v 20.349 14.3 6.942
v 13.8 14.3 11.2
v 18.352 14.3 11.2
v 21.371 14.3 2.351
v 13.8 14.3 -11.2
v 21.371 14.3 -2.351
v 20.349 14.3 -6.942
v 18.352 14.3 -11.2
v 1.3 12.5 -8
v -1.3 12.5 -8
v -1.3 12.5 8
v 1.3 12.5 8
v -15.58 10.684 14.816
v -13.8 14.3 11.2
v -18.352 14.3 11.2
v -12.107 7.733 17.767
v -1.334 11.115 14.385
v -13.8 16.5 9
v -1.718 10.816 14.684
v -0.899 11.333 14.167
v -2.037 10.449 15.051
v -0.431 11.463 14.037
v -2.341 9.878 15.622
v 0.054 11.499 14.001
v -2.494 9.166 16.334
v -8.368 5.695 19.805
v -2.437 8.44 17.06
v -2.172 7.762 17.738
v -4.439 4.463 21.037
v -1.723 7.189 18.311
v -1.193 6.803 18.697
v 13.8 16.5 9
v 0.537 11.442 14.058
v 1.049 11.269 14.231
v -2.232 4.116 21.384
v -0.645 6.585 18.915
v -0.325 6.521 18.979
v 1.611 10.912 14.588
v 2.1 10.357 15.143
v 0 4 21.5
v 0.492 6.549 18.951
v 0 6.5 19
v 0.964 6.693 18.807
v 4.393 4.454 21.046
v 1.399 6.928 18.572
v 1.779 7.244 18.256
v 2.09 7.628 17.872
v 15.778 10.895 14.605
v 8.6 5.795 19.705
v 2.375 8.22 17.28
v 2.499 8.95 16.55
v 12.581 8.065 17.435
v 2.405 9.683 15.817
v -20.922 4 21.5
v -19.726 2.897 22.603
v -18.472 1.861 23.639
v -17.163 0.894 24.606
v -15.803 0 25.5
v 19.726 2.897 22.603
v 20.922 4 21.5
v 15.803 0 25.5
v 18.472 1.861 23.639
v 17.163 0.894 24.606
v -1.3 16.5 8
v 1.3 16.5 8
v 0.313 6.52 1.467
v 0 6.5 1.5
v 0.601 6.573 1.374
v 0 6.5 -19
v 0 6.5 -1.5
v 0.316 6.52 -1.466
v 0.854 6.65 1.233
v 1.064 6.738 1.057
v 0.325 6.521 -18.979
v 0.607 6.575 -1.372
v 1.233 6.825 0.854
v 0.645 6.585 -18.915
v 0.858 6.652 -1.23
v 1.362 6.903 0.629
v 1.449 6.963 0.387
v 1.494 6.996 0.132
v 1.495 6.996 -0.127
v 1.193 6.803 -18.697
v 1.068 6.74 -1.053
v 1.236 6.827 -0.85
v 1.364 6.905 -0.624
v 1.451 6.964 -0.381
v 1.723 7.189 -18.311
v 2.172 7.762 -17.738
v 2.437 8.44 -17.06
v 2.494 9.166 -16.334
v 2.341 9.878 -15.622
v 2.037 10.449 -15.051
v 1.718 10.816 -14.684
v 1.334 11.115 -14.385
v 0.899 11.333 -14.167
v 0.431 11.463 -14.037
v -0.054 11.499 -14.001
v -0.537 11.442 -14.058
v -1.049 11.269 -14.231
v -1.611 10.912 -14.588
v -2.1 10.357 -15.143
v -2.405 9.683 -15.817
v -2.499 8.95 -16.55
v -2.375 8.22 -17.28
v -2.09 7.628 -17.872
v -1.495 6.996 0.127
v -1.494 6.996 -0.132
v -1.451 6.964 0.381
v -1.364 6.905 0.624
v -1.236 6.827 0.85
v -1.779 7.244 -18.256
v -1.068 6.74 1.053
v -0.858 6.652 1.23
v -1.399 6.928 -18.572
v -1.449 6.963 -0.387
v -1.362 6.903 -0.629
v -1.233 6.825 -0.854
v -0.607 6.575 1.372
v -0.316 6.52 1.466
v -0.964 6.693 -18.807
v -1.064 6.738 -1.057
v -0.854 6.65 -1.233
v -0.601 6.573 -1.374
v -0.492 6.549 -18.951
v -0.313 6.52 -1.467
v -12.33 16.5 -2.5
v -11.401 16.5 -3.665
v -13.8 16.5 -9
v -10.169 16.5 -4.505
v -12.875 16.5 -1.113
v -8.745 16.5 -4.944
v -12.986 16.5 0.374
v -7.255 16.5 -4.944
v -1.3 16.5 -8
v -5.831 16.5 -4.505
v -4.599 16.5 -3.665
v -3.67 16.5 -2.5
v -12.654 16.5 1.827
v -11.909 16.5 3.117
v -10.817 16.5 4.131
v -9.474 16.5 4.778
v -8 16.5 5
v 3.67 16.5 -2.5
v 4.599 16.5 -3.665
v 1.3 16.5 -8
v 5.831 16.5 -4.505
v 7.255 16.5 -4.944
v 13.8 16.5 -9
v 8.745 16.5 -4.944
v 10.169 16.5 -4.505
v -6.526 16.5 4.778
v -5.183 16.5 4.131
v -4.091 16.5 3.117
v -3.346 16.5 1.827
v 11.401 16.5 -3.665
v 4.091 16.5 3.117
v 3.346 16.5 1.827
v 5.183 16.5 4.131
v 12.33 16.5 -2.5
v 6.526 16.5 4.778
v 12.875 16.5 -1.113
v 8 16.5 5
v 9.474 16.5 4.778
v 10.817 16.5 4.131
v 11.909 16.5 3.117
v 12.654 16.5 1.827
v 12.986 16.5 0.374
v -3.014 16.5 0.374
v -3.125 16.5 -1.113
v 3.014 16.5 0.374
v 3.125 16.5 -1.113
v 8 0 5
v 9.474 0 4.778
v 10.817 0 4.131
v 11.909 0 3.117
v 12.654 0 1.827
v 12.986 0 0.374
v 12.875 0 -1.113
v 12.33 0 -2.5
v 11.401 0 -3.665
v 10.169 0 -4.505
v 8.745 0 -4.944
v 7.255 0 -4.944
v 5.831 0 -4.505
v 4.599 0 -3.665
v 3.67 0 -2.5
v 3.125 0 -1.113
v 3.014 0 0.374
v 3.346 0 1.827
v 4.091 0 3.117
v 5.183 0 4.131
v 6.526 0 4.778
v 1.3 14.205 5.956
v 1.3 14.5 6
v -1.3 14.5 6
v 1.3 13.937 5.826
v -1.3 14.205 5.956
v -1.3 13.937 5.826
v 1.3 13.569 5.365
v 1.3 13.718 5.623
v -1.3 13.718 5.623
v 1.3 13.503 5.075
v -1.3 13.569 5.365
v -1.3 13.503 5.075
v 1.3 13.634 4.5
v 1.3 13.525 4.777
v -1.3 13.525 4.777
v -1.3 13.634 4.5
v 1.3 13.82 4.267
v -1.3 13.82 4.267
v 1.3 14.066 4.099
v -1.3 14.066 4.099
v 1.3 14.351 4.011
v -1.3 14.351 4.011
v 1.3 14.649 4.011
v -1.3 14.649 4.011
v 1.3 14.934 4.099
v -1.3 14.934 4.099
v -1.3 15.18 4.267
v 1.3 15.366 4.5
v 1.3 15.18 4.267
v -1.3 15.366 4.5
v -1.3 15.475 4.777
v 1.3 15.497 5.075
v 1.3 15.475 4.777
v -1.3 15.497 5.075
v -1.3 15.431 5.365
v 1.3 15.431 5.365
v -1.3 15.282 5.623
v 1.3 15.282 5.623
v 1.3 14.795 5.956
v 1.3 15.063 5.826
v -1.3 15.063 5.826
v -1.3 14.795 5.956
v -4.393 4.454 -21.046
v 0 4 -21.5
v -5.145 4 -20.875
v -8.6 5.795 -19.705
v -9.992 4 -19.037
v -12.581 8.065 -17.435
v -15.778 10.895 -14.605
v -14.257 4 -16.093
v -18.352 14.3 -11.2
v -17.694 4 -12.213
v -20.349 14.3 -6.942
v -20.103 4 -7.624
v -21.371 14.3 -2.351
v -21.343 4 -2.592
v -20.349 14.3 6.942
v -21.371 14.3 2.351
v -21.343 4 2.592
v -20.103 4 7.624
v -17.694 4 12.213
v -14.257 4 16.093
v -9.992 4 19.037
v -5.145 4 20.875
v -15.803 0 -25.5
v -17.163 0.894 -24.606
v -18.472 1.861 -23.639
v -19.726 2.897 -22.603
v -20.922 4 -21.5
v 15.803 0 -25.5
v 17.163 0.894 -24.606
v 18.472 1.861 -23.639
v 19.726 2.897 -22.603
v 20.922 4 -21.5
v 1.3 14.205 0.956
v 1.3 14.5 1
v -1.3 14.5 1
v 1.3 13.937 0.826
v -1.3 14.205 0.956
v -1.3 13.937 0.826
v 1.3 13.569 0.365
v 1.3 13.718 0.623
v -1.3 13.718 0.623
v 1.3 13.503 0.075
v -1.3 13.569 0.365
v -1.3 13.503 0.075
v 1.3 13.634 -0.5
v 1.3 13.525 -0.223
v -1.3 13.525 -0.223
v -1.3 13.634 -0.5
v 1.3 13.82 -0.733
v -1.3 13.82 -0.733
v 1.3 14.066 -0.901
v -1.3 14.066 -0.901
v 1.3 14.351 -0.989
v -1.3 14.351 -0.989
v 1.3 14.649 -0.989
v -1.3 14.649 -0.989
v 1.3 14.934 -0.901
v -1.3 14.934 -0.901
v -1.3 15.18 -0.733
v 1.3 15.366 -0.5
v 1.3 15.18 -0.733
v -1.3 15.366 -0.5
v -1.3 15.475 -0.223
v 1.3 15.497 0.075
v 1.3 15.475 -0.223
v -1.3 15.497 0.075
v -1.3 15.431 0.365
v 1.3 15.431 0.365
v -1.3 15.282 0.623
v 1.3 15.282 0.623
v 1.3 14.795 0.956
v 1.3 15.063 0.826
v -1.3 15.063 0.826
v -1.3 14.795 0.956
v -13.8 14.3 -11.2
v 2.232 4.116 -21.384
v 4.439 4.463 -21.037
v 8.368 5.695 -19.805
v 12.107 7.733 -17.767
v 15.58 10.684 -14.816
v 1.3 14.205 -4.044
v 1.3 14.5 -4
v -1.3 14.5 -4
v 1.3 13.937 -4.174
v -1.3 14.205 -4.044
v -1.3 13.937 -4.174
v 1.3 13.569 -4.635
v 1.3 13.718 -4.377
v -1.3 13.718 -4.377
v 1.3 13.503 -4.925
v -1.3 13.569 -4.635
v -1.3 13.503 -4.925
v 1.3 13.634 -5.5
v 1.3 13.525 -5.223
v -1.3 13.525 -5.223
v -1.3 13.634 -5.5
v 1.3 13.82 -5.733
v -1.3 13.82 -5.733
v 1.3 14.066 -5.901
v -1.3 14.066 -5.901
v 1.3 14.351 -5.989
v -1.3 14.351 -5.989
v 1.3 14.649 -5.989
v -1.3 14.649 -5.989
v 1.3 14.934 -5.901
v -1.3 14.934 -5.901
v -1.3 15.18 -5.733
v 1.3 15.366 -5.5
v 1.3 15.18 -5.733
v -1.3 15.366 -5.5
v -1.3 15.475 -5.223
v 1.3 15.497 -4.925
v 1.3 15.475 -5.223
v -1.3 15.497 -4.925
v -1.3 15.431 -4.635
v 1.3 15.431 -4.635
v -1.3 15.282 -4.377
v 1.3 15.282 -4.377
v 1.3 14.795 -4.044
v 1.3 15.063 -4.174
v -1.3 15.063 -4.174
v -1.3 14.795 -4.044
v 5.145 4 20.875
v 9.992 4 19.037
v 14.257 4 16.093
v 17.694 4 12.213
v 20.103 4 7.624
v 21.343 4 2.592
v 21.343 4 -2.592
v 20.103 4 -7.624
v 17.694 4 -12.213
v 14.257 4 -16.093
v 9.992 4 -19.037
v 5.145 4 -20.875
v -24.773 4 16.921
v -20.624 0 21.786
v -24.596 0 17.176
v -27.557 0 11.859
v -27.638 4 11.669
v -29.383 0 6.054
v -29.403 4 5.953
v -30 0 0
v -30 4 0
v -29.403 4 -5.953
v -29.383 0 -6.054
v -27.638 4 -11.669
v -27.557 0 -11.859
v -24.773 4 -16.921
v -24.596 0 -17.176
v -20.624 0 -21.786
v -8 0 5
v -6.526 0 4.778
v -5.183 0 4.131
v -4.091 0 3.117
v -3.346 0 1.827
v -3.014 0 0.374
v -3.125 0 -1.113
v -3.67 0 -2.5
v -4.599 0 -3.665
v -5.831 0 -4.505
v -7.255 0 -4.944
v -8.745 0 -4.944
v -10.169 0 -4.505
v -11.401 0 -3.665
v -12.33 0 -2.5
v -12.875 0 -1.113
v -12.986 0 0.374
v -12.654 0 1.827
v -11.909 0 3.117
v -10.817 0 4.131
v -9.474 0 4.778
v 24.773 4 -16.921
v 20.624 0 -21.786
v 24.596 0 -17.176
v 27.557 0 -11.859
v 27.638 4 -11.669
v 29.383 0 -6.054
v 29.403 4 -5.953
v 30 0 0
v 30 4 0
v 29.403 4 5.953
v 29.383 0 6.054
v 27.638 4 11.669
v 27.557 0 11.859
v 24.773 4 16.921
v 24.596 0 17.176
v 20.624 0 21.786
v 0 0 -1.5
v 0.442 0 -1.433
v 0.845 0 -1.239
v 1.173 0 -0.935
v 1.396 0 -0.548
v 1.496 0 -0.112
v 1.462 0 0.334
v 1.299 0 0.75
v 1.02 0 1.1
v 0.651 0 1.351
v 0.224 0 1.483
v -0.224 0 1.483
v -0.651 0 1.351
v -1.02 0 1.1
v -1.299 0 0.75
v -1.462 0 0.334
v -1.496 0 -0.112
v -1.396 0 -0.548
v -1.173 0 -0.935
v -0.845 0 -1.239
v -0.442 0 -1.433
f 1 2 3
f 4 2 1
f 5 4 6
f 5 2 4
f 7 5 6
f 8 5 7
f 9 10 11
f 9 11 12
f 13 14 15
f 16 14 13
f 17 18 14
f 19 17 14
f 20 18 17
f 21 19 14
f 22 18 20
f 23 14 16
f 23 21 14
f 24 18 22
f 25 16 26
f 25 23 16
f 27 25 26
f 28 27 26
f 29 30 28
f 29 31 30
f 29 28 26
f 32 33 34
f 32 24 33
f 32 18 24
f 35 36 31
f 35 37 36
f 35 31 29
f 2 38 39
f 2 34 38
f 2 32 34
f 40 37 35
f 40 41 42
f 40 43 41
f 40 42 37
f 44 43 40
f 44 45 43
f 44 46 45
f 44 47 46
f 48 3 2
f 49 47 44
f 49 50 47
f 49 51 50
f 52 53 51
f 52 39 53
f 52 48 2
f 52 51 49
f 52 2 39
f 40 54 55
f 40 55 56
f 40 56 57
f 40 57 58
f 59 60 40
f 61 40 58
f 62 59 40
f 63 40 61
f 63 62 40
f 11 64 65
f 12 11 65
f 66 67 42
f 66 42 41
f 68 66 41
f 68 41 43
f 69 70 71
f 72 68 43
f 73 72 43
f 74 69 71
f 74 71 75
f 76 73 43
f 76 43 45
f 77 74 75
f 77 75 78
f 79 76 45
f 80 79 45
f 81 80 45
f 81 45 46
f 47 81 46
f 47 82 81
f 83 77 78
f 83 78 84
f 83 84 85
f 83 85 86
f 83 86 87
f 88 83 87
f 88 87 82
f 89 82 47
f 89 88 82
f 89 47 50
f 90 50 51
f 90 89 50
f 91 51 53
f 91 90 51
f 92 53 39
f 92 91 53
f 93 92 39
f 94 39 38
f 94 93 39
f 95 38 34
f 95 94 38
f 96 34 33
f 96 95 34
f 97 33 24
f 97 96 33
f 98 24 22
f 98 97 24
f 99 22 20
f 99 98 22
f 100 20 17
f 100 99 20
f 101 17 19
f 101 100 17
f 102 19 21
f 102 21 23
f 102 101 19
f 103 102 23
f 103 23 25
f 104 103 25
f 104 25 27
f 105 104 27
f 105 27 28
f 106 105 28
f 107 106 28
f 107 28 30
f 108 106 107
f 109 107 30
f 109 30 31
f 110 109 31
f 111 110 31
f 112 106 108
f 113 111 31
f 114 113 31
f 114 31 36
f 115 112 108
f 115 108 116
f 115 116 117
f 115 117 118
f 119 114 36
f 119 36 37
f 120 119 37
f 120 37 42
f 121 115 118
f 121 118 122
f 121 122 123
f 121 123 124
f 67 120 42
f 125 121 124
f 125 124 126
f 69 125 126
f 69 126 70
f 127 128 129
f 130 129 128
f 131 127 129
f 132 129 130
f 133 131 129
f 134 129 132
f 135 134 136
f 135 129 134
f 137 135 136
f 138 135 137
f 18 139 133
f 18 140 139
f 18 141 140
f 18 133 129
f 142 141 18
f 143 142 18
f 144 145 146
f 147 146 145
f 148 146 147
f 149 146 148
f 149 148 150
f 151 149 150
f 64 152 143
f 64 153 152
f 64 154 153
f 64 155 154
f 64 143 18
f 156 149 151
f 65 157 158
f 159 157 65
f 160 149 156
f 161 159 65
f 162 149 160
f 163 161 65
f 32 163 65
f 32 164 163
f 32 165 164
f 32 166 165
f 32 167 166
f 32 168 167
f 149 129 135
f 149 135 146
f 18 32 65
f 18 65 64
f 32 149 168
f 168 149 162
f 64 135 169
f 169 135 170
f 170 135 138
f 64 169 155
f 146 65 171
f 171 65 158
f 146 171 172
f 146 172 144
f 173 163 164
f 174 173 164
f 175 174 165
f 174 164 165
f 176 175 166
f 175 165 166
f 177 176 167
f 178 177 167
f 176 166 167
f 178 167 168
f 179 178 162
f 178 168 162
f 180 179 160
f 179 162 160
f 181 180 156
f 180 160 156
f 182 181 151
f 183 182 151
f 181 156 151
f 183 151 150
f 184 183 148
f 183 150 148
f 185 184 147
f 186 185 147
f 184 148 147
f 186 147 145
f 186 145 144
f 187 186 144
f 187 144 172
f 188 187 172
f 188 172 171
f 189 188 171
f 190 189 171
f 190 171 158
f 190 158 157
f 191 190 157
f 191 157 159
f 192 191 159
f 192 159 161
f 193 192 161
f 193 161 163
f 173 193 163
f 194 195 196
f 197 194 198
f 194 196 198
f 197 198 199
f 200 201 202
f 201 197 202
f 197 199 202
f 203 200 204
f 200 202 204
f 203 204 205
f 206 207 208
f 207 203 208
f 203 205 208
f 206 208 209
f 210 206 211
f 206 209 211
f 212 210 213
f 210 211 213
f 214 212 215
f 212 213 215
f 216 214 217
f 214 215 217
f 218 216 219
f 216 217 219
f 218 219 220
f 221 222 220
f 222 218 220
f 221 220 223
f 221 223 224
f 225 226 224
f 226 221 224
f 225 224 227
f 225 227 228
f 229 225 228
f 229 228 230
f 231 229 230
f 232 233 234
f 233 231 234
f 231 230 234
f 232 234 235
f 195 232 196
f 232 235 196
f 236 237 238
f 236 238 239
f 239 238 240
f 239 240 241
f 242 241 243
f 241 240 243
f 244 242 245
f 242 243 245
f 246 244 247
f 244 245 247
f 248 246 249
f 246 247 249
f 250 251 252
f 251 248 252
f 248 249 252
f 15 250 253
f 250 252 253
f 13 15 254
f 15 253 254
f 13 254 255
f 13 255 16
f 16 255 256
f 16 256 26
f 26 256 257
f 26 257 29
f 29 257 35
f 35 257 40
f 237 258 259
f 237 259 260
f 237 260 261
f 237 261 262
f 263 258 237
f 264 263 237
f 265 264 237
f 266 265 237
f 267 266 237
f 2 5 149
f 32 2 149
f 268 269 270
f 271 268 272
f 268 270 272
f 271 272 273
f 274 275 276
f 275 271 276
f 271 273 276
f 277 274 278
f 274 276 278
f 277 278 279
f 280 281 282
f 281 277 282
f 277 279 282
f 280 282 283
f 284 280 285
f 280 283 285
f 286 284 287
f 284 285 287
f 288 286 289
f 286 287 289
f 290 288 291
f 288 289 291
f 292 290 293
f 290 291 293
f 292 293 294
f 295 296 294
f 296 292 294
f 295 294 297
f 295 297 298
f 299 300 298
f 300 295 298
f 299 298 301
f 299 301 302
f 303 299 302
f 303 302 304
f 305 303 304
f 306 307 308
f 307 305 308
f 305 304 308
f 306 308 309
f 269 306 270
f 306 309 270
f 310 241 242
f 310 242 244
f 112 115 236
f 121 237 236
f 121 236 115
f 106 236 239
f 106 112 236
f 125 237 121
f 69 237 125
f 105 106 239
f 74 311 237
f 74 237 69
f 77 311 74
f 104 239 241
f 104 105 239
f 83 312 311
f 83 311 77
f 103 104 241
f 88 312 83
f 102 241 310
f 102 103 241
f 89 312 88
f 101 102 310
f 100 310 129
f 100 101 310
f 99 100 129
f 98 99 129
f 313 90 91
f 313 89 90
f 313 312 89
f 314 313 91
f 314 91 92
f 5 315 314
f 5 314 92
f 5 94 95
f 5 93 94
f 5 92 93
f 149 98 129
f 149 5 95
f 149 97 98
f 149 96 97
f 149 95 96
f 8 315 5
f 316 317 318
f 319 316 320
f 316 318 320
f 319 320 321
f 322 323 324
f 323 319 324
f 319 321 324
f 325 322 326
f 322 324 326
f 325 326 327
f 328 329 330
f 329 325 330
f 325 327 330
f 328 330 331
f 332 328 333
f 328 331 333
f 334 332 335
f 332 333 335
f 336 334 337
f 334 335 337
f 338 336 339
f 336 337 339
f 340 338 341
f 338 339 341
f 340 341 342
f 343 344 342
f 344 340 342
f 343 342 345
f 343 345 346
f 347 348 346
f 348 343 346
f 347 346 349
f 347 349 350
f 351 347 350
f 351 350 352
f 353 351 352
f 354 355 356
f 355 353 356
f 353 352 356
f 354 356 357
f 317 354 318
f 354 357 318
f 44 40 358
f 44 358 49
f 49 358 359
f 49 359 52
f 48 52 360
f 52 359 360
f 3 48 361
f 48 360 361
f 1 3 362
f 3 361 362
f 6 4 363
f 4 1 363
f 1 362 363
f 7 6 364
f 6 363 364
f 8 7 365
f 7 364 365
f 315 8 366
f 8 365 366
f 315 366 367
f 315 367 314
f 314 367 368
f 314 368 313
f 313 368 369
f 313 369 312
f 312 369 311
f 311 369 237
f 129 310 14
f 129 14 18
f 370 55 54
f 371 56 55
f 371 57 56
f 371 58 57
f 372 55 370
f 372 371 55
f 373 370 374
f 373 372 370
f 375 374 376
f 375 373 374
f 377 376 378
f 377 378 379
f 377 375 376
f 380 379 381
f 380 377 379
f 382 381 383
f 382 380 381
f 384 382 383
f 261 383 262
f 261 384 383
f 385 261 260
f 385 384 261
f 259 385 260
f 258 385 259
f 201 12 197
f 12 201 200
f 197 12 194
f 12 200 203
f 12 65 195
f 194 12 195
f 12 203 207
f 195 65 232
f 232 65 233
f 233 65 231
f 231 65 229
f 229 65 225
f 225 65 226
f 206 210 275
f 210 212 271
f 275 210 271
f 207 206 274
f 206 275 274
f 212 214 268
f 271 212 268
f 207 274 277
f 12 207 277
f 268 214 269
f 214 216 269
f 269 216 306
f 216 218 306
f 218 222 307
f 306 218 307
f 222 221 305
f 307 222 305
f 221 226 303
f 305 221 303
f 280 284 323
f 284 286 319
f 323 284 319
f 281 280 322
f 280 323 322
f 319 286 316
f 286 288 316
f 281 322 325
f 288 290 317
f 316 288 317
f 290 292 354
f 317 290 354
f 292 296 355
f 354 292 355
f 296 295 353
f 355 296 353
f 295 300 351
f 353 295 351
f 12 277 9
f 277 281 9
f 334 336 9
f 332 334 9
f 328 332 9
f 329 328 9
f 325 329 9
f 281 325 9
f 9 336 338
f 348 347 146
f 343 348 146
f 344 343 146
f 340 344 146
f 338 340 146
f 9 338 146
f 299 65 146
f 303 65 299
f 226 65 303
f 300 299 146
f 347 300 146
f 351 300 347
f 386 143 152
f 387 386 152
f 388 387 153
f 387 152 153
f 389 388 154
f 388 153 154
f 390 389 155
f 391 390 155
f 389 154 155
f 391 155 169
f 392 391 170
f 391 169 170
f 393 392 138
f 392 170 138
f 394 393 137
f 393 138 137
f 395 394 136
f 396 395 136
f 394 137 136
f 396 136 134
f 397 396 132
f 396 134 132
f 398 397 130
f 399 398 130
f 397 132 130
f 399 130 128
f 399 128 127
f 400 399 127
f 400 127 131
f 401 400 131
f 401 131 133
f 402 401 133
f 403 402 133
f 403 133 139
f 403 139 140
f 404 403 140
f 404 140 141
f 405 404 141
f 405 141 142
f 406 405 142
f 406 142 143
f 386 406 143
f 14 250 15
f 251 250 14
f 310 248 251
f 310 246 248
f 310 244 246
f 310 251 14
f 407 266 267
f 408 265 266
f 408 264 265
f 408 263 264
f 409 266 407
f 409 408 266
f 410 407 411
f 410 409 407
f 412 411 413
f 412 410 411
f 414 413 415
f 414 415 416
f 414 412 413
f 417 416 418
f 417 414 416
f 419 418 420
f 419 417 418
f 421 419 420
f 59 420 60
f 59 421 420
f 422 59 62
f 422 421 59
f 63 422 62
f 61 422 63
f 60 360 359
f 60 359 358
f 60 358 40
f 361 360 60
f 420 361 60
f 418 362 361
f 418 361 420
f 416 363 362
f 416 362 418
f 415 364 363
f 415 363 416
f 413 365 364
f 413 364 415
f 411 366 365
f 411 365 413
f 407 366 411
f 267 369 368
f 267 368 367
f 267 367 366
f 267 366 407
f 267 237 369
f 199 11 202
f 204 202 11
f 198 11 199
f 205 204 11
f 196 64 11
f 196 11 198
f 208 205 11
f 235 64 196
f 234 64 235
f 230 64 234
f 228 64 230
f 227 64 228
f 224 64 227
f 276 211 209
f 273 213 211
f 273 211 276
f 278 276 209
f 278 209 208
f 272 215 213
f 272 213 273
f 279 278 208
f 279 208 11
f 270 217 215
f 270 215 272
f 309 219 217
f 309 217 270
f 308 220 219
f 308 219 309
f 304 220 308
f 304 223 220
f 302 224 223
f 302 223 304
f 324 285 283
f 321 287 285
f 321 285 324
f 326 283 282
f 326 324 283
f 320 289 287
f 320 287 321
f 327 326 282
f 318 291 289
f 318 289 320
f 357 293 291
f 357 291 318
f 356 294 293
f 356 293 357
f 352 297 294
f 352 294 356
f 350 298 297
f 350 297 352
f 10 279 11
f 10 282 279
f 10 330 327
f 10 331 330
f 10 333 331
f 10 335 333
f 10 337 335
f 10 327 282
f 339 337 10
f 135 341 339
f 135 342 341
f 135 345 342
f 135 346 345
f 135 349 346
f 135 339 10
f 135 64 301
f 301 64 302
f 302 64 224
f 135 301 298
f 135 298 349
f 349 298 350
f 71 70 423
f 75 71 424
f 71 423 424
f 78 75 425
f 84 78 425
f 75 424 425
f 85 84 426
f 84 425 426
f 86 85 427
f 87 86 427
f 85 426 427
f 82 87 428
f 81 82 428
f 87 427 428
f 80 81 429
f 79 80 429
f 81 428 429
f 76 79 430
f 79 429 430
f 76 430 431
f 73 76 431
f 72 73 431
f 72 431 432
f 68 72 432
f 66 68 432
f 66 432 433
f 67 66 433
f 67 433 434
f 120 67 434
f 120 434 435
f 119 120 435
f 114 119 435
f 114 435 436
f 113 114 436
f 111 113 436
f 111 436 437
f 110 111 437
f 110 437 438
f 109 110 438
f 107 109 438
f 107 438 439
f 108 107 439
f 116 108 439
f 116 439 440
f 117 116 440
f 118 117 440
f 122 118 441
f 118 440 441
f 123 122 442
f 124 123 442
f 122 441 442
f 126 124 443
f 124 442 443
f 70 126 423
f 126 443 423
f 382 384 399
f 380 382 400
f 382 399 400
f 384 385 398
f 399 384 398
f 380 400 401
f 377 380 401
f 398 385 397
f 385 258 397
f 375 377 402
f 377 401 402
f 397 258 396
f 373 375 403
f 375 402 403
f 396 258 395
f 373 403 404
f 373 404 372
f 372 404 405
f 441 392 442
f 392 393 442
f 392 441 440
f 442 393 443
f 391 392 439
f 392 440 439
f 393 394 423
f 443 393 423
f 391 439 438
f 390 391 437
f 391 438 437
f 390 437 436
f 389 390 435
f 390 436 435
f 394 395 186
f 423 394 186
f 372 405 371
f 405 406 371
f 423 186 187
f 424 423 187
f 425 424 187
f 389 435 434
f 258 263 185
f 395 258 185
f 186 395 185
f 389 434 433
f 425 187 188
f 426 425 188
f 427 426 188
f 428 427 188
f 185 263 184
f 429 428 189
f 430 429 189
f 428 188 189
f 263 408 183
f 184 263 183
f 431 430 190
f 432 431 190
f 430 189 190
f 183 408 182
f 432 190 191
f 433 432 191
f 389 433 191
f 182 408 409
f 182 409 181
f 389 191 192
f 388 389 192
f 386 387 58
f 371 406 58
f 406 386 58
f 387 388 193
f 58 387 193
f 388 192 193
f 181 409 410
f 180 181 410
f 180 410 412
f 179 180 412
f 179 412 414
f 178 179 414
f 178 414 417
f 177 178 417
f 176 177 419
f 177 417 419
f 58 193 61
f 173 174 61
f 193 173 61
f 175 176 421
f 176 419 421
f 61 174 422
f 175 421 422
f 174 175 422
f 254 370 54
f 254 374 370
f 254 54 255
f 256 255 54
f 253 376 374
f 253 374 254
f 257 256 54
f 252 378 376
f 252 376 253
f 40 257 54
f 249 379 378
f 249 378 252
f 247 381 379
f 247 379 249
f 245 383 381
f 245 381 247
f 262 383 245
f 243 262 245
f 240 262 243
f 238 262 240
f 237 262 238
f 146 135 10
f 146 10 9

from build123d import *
from build123d.topology import SkipClean

# Parameters (mm, degrees)
SKETCH1_R                            = 30
BOSS_EXTRUDE1_DEPTH                  = 4
BOSS_EXTRUDE2_REACH                  = 44.615
BOSS_EXTRUDE2_END_RADIUS             = 30
BOSS_EXTRUDE2_DIRECTION_2_REACH      = 44.615
BOSS_EXTRUDE2_DIRECTION_2_END_RADIUS = 30
SKETCH3_OUTSIDE_W                    = 78.092
SKETCH3_OUTSIDE_H                    = 69.092
SKETCH3_OUTSIDE_R                    = 21.5
CUT_EXTRUDE2_DEPTH                   = 12.5
BOSS_EXTRUDE3_DEPTH                  = 18
BOSS_EXTRUDE4_DEPTH                  = 15
BOSS_EXTRUDE5_DEPTH                  = 15
CUT_EXTRUDE3_DEPTH                   = 44.292609069
CUT_EXTRUDE3_DEPTH_BACK              = 44.292609069
SKETCH8_R                            = 2
CUT_EXTRUDE8_DEPTH                   = 48.077064479
CUT_EXTRUDE8_DEPTH_BACK              = 48.077064479
CUT_EXTRUDE9_DEPTH                   = 59.659818207
CUT_EXTRUDE11_DEPTH                  = 20
CUT_EXTRUDE12_DEPTH                  = 20
CUT_EXTRUDE13_DEPTH                  = 20
CUT_EXTRUDE14_DEPTH                  = 44.292609069
CUT_EXTRUDE14_DEPTH_BACK             = 44.292609069
SKETCH25_W                           = 66.075437062
SKETCH25_H                           = 20.142243048
SKETCH26_R                           = 5
CUT_EXTRUDE15_DEPTH                  = 24
CUT_EXTRUDE17_DEPTH                  = 47.524187258
CUT_EXTRUDE17_DEPTH_BACK             = 47.524187258
SKETCH29_W                           = 7.7
SKETCH29_H                           = 2.2
CUT_EXTRUDE18_DEPTH                  = 47.524187258
CUT_EXTRUDE18_DEPTH_BACK             = 47.524187258
SKETCH31_W                           = 7.7
SKETCH31_H                           = 2.2
CUT_EXTRUDE20_DEPTH                  = 43.690748412
CUT_EXTRUDE20_DEPTH_BACK             = 43.690748412
SKETCH33_R                           = 2.5
SKETCH34_R                           = 1.5
CUT_EXTRUDE21_DEPTH                  = 10
SKETCH35_W                           = 2.6
SKETCH35_H                           = 16
CUT_EXTRUDE23_DEPTH                  = 4
BOSS_EXTRUDE6_REACH                  = 45.614
SKETCH37_R                           = 1


with BuildPart() as part:
    # Sketch1 → Boss-Extrude1 (new body)
    with BuildSketch(Plane(origin=(0, 0, 0), x_dir=(1, 0, 0), z_dir=(0, 1, 0))):
        with Locations(Location((0, 0, 0), (0, 0, 270))):
            Circle(SKETCH1_R)
    extrude(amount=BOSS_EXTRUDE1_DEPTH)

    # Boss-Extrude2: up to this cylinder (the profile starts inside it)
    with SkipClean():  # the faces are left unmerged after this step: merging them gives an invalid solid
        boss_extrude2_end = Plane(origin=(0, 9.396175, 0), z_dir=(0, -1, 0)) * Cylinder(BOSS_EXTRUDE2_END_RADIUS, 150.23, mode=Mode.PRIVATE)
        # Sketch2 → Boss-Extrude2 (add, up to the surface)
        with BuildSketch(Plane(origin=(0, 0, 0), x_dir=(0, 0, -1), z_dir=(1, 0, 0)), mode=Mode.PRIVATE) as boss_extrude2_sk1:
            Polygon((0, 4), (21.5, 4), (9, 16.5), (-9, 16.5), (-21.5, 4), align=None)
        boss_extrude2_tool1 = extrude(boss_extrude2_sk1.sketch, amount=BOSS_EXTRUDE2_REACH, mode=Mode.PRIVATE) & boss_extrude2_end
        add(boss_extrude2_tool1.solids().sort_by_distance((0, 9.396175, 0))[0])

    # Boss-Extrude2 direction 2: up to this cylinder (the profile starts inside it)
    with SkipClean():  # the faces are left unmerged after this step: merging them gives an invalid solid
        boss_extrude2_direction_2_end = Plane(origin=(0, 9.396175, 0), z_dir=(0, -1, 0)) * Cylinder(BOSS_EXTRUDE2_DIRECTION_2_END_RADIUS, 150.23, mode=Mode.PRIVATE)
        # Sketch2 → Boss-Extrude2 direction 2 (add, up to the surface)
        with BuildSketch(Plane(origin=(0, 0, 0), x_dir=(0, 0, -1), z_dir=(1, 0, 0)), mode=Mode.PRIVATE) as boss_extrude2_direction_2_sk1:
            Polygon((0, 4), (21.5, 4), (9, 16.5), (-9, 16.5), (-21.5, 4), align=None)
        boss_extrude2_direction_2_tool1 = extrude(boss_extrude2_direction_2_sk1.sketch, amount=-BOSS_EXTRUDE2_DIRECTION_2_REACH, mode=Mode.PRIVATE) & boss_extrude2_direction_2_end
        add(boss_extrude2_direction_2_tool1.solids().sort_by_distance((0, 9.396175, 0))[0])

    # SurfaceCut1
    split(bisect_by=Plane(origin=(0, 12.75, -12.75), x_dir=(1, 0, 0), z_dir=(0, 0.7071067811865558, -0.7071067811865392)), keep=Keep.BOTTOM)

    # SurfaceCut2
    split(bisect_by=Plane(origin=(0, 12.75, 12.75), x_dir=(1, 0, 0), z_dir=(0, 0.7071067811865509, 0.7071067811865442)), keep=Keep.BOTTOM)

    # Sketch3 outside → Cut-Extrude2 (cut)
    with BuildSketch(Plane(origin=(0, 4, 0), x_dir=(1, 0, 0), z_dir=(0, 1, 0))):
        Rectangle(SKETCH3_OUTSIDE_W, SKETCH3_OUTSIDE_H)
        Circle(SKETCH3_OUTSIDE_R, mode=Mode.SUBTRACT)
    extrude(amount=CUT_EXTRUDE2_DEPTH, mode=Mode.SUBTRACT)

    # Sketch5 → Boss-Extrude3 (add)
    with BuildSketch(Plane(origin=(0, 0, 0), x_dir=(-1, 0, 0), z_dir=(0, -1, 0))):
        Polygon((0, -6), (-17.5, -6), (-17.5, 6), (17.5, 6), (17.5, -6), align=None)
    extrude(amount=BOSS_EXTRUDE3_DEPTH)

    # Sketch6 → Boss-Extrude4 (add)
    with BuildSketch(Plane.XZ):
        Polygon((0, 15), (7, 15), (7, 6), (-7, 6), (-7, 15), align=None)
    extrude(amount=BOSS_EXTRUDE4_DEPTH)

    # Sketch7 → Boss-Extrude5 (add)
    with BuildSketch(Plane.XZ):
        Polygon((0, -15), (7, -15), (7, -6), (-7, -6), (-7, -15), align=None)
    extrude(amount=BOSS_EXTRUDE5_DEPTH)

    # Sketch8 → Cut-Extrude3 (cut, two sides: drawn at the far end of the back side and taken through both)
    with BuildSketch(Plane.XY.offset(-CUT_EXTRUDE3_DEPTH_BACK)):
        with Locations((-12.5, -12.5)):
            Circle(SKETCH8_R)
        with Locations((12.5, -12.5)):
            Circle(SKETCH8_R)
    extrude(amount=CUT_EXTRUDE3_DEPTH + CUT_EXTRUDE3_DEPTH_BACK, mode=Mode.SUBTRACT)

    # Sketch16 → Cut-Extrude8 (cut, two sides: drawn at the far end of the back side and taken through both)
    with BuildSketch(Plane.XY.offset(6).offset(-CUT_EXTRUDE8_DEPTH_BACK)):
        Polygon((17.5, -18), (17.5, -14.5), (14, -18), align=None)
        Polygon((-17.5, -18), (-14, -18), (-17.5, -14.5), align=None)
    extrude(amount=CUT_EXTRUDE8_DEPTH + CUT_EXTRUDE8_DEPTH_BACK, mode=Mode.SUBTRACT)

    # Sketch17 → Cut-Extrude9 (cut, through all)
    with BuildSketch(Plane(origin=(10.365975269, -9.674910251, -8.062425209), x_dir=(-0.3613483622370374, 0.337258471421235, -0.8693009171531012), z_dir=(0.6355070151731325, -0.5931398808282571, -0.49428323402354774))):
        Polygon((-2.372510104, -6.189601271), (7.980636686, -0.706686759), (7.980636686, -10.965829024), align=None)
    extrude(amount=CUT_EXTRUDE9_DEPTH, mode=Mode.SUBTRACT)

    # Sketch19 → Cut-Extrude11 (cut)
    with BuildSketch(Plane(origin=(-10.365975269, -9.674910251, -8.062425209), x_dir=(0.3613483622370374, 0.33725847142123494, -0.8693009171531012), z_dir=(0.6355070151731324, 0.5931398808282571, 0.4942832340235476))):
        Polygon((-2.372510104, -6.189601271), (7.980636686, -10.965829024), (7.980636686, -0.706686759), align=None)
    extrude(amount=-CUT_EXTRUDE11_DEPTH, mode=Mode.SUBTRACT)

    # Sketch20 → Cut-Extrude12 (cut)
    with BuildSketch(Plane(origin=(-10.365975269, -9.674910251, 8.062425209), x_dir=(-0.3613483622370374, -0.3372584714212349, -0.8693009171531013), z_dir=(0.6355070151731326, 0.593139880828257, -0.49428323402354757))):
        Polygon((2.372510104, -6.189601271), (-7.980636686, -0.706686759), (-7.980636686, -10.965829024), align=None)
    extrude(amount=-CUT_EXTRUDE12_DEPTH, mode=Mode.SUBTRACT)

    # Sketch21 → Cut-Extrude13 (cut)
    with BuildSketch(Plane(origin=(10.365975269, -9.674910251, 8.062425209), x_dir=(-0.3613483622370374, 0.3372584714212349, 0.8693009171531013), z_dir=(-0.6355070151731326, 0.593139880828257, -0.49428323402354757))):
        Polygon((-2.372510104, -6.189601271), (7.980636686, -0.706686759), (7.980636686, -10.965829024), align=None)
    extrude(amount=-CUT_EXTRUDE13_DEPTH, mode=Mode.SUBTRACT)

    # Sketch25 → Cut-Extrude14 (cut, two sides: drawn at the far end of the back side and taken through both)
    with BuildSketch(Plane.XY.offset(-CUT_EXTRUDE14_DEPTH_BACK)):
        with Locations((0, -10.071121524)):
            Rectangle(SKETCH25_W, SKETCH25_H)
    extrude(amount=CUT_EXTRUDE14_DEPTH + CUT_EXTRUDE14_DEPTH_BACK, mode=Mode.SUBTRACT)

    # Sketch26 → Cut-Extrude15 (cut)
    with BuildSketch(Plane(origin=(0, 16.5, 0), x_dir=(1, 0, 0), z_dir=(0, 1, 0))):
        with Locations(Location((-8, 0, 0), (0, 0, 270))):
            Circle(SKETCH26_R)
        with Locations(Location((8, 0, 0), (0, 0, 270))):
            Circle(SKETCH26_R)
    extrude(amount=-CUT_EXTRUDE15_DEPTH, mode=Mode.SUBTRACT)

    # Sketch29 → Cut-Extrude17 (cut, two sides: drawn at the far end of the back side and taken through both)
    with BuildSketch(Plane.XY.offset(6).offset(-CUT_EXTRUDE17_DEPTH_BACK)):
        with Locations((17.65, 15.4)):
            Rectangle(SKETCH29_W, SKETCH29_H)
    extrude(amount=CUT_EXTRUDE17_DEPTH + CUT_EXTRUDE17_DEPTH_BACK, mode=Mode.SUBTRACT)

    # Sketch31 → Cut-Extrude18 (cut, two sides: drawn at the far end of the back side and taken through both)
    with BuildSketch(Plane.XY.offset(6).offset(-CUT_EXTRUDE18_DEPTH_BACK)):
        with Locations((-17.65, 15.4)):
            Rectangle(SKETCH31_W, SKETCH31_H)
    extrude(amount=CUT_EXTRUDE18_DEPTH + CUT_EXTRUDE18_DEPTH_BACK, mode=Mode.SUBTRACT)

    # Sketch33 → Cut-Extrude20 (cut, two sides: drawn at the far end of the back side and taken through both)
    with BuildSketch(Plane.XY.offset(-CUT_EXTRUDE20_DEPTH_BACK)):
        with Locations(Location((0, 9, 0), (0, 0, 270))):
            Circle(SKETCH33_R)
    extrude(amount=CUT_EXTRUDE20_DEPTH + CUT_EXTRUDE20_DEPTH_BACK, mode=Mode.SUBTRACT)

    # Sketch34 → Cut-Extrude21 (cut)
    with BuildSketch(Plane.XZ):
        with Locations(Location((0, 0, 0), (0, 0, 270))):
            Circle(SKETCH34_R)
    extrude(amount=-CUT_EXTRUDE21_DEPTH, mode=Mode.SUBTRACT)

    # Sketch35 → Cut-Extrude23 (cut)
    with BuildSketch(Plane(origin=(0, 16.5, 0), x_dir=(1, 0, 0), z_dir=(0, 1, 0))):
        Rectangle(SKETCH35_W, SKETCH35_H)
    extrude(amount=-CUT_EXTRUDE23_DEPTH, mode=Mode.SUBTRACT)

    # Sketch37 → Boss-Extrude6 (add, up to next)
    with BuildSketch(Plane(origin=(-1.3, 0, 0), x_dir=(0, 0, -1), z_dir=(1, 0, 0)), mode=Mode.PRIVATE) as boss_extrude6_sk1:
        with Locations(Location((-5, 14.5, 0), (0, 0, 180))):
            Circle(SKETCH37_R)
    boss_extrude6_tool1 = extrude(boss_extrude6_sk1.sketch, amount=BOSS_EXTRUDE6_REACH, mode=Mode.PRIVATE) - part.part
    # Sketch37 → Boss-Extrude6 (add, up to next)
    with BuildSketch(Plane(origin=(-1.3, 0, 0), x_dir=(0, 0, -1), z_dir=(1, 0, 0)), mode=Mode.PRIVATE) as boss_extrude6_sk2:
        with Locations(Location((0, 14.5, 0), (0, 0, 180))):
            Circle(SKETCH37_R)
    boss_extrude6_tool2 = extrude(boss_extrude6_sk2.sketch, amount=BOSS_EXTRUDE6_REACH, mode=Mode.PRIVATE) - part.part
    # Sketch37 → Boss-Extrude6 (add, up to next)
    with BuildSketch(Plane(origin=(-1.3, 0, 0), x_dir=(0, 0, -1), z_dir=(1, 0, 0)), mode=Mode.PRIVATE) as boss_extrude6_sk3:
        with Locations(Location((5, 14.5, 0), (0, 0, 180))):
            Circle(SKETCH37_R)
    boss_extrude6_tool3 = extrude(boss_extrude6_sk3.sketch, amount=BOSS_EXTRUDE6_REACH, mode=Mode.PRIVATE) - part.part
    add(boss_extrude6_tool1.solids().sort_by_distance((-1.3, 14.5, 5))[0])
    add(boss_extrude6_tool2.solids().sort_by_distance((-1.3, 14.5, 0))[0])
    add(boss_extrude6_tool3.solids().sort_by_distance((-1.3, 14.5, -5))[0])


solid = part.part
